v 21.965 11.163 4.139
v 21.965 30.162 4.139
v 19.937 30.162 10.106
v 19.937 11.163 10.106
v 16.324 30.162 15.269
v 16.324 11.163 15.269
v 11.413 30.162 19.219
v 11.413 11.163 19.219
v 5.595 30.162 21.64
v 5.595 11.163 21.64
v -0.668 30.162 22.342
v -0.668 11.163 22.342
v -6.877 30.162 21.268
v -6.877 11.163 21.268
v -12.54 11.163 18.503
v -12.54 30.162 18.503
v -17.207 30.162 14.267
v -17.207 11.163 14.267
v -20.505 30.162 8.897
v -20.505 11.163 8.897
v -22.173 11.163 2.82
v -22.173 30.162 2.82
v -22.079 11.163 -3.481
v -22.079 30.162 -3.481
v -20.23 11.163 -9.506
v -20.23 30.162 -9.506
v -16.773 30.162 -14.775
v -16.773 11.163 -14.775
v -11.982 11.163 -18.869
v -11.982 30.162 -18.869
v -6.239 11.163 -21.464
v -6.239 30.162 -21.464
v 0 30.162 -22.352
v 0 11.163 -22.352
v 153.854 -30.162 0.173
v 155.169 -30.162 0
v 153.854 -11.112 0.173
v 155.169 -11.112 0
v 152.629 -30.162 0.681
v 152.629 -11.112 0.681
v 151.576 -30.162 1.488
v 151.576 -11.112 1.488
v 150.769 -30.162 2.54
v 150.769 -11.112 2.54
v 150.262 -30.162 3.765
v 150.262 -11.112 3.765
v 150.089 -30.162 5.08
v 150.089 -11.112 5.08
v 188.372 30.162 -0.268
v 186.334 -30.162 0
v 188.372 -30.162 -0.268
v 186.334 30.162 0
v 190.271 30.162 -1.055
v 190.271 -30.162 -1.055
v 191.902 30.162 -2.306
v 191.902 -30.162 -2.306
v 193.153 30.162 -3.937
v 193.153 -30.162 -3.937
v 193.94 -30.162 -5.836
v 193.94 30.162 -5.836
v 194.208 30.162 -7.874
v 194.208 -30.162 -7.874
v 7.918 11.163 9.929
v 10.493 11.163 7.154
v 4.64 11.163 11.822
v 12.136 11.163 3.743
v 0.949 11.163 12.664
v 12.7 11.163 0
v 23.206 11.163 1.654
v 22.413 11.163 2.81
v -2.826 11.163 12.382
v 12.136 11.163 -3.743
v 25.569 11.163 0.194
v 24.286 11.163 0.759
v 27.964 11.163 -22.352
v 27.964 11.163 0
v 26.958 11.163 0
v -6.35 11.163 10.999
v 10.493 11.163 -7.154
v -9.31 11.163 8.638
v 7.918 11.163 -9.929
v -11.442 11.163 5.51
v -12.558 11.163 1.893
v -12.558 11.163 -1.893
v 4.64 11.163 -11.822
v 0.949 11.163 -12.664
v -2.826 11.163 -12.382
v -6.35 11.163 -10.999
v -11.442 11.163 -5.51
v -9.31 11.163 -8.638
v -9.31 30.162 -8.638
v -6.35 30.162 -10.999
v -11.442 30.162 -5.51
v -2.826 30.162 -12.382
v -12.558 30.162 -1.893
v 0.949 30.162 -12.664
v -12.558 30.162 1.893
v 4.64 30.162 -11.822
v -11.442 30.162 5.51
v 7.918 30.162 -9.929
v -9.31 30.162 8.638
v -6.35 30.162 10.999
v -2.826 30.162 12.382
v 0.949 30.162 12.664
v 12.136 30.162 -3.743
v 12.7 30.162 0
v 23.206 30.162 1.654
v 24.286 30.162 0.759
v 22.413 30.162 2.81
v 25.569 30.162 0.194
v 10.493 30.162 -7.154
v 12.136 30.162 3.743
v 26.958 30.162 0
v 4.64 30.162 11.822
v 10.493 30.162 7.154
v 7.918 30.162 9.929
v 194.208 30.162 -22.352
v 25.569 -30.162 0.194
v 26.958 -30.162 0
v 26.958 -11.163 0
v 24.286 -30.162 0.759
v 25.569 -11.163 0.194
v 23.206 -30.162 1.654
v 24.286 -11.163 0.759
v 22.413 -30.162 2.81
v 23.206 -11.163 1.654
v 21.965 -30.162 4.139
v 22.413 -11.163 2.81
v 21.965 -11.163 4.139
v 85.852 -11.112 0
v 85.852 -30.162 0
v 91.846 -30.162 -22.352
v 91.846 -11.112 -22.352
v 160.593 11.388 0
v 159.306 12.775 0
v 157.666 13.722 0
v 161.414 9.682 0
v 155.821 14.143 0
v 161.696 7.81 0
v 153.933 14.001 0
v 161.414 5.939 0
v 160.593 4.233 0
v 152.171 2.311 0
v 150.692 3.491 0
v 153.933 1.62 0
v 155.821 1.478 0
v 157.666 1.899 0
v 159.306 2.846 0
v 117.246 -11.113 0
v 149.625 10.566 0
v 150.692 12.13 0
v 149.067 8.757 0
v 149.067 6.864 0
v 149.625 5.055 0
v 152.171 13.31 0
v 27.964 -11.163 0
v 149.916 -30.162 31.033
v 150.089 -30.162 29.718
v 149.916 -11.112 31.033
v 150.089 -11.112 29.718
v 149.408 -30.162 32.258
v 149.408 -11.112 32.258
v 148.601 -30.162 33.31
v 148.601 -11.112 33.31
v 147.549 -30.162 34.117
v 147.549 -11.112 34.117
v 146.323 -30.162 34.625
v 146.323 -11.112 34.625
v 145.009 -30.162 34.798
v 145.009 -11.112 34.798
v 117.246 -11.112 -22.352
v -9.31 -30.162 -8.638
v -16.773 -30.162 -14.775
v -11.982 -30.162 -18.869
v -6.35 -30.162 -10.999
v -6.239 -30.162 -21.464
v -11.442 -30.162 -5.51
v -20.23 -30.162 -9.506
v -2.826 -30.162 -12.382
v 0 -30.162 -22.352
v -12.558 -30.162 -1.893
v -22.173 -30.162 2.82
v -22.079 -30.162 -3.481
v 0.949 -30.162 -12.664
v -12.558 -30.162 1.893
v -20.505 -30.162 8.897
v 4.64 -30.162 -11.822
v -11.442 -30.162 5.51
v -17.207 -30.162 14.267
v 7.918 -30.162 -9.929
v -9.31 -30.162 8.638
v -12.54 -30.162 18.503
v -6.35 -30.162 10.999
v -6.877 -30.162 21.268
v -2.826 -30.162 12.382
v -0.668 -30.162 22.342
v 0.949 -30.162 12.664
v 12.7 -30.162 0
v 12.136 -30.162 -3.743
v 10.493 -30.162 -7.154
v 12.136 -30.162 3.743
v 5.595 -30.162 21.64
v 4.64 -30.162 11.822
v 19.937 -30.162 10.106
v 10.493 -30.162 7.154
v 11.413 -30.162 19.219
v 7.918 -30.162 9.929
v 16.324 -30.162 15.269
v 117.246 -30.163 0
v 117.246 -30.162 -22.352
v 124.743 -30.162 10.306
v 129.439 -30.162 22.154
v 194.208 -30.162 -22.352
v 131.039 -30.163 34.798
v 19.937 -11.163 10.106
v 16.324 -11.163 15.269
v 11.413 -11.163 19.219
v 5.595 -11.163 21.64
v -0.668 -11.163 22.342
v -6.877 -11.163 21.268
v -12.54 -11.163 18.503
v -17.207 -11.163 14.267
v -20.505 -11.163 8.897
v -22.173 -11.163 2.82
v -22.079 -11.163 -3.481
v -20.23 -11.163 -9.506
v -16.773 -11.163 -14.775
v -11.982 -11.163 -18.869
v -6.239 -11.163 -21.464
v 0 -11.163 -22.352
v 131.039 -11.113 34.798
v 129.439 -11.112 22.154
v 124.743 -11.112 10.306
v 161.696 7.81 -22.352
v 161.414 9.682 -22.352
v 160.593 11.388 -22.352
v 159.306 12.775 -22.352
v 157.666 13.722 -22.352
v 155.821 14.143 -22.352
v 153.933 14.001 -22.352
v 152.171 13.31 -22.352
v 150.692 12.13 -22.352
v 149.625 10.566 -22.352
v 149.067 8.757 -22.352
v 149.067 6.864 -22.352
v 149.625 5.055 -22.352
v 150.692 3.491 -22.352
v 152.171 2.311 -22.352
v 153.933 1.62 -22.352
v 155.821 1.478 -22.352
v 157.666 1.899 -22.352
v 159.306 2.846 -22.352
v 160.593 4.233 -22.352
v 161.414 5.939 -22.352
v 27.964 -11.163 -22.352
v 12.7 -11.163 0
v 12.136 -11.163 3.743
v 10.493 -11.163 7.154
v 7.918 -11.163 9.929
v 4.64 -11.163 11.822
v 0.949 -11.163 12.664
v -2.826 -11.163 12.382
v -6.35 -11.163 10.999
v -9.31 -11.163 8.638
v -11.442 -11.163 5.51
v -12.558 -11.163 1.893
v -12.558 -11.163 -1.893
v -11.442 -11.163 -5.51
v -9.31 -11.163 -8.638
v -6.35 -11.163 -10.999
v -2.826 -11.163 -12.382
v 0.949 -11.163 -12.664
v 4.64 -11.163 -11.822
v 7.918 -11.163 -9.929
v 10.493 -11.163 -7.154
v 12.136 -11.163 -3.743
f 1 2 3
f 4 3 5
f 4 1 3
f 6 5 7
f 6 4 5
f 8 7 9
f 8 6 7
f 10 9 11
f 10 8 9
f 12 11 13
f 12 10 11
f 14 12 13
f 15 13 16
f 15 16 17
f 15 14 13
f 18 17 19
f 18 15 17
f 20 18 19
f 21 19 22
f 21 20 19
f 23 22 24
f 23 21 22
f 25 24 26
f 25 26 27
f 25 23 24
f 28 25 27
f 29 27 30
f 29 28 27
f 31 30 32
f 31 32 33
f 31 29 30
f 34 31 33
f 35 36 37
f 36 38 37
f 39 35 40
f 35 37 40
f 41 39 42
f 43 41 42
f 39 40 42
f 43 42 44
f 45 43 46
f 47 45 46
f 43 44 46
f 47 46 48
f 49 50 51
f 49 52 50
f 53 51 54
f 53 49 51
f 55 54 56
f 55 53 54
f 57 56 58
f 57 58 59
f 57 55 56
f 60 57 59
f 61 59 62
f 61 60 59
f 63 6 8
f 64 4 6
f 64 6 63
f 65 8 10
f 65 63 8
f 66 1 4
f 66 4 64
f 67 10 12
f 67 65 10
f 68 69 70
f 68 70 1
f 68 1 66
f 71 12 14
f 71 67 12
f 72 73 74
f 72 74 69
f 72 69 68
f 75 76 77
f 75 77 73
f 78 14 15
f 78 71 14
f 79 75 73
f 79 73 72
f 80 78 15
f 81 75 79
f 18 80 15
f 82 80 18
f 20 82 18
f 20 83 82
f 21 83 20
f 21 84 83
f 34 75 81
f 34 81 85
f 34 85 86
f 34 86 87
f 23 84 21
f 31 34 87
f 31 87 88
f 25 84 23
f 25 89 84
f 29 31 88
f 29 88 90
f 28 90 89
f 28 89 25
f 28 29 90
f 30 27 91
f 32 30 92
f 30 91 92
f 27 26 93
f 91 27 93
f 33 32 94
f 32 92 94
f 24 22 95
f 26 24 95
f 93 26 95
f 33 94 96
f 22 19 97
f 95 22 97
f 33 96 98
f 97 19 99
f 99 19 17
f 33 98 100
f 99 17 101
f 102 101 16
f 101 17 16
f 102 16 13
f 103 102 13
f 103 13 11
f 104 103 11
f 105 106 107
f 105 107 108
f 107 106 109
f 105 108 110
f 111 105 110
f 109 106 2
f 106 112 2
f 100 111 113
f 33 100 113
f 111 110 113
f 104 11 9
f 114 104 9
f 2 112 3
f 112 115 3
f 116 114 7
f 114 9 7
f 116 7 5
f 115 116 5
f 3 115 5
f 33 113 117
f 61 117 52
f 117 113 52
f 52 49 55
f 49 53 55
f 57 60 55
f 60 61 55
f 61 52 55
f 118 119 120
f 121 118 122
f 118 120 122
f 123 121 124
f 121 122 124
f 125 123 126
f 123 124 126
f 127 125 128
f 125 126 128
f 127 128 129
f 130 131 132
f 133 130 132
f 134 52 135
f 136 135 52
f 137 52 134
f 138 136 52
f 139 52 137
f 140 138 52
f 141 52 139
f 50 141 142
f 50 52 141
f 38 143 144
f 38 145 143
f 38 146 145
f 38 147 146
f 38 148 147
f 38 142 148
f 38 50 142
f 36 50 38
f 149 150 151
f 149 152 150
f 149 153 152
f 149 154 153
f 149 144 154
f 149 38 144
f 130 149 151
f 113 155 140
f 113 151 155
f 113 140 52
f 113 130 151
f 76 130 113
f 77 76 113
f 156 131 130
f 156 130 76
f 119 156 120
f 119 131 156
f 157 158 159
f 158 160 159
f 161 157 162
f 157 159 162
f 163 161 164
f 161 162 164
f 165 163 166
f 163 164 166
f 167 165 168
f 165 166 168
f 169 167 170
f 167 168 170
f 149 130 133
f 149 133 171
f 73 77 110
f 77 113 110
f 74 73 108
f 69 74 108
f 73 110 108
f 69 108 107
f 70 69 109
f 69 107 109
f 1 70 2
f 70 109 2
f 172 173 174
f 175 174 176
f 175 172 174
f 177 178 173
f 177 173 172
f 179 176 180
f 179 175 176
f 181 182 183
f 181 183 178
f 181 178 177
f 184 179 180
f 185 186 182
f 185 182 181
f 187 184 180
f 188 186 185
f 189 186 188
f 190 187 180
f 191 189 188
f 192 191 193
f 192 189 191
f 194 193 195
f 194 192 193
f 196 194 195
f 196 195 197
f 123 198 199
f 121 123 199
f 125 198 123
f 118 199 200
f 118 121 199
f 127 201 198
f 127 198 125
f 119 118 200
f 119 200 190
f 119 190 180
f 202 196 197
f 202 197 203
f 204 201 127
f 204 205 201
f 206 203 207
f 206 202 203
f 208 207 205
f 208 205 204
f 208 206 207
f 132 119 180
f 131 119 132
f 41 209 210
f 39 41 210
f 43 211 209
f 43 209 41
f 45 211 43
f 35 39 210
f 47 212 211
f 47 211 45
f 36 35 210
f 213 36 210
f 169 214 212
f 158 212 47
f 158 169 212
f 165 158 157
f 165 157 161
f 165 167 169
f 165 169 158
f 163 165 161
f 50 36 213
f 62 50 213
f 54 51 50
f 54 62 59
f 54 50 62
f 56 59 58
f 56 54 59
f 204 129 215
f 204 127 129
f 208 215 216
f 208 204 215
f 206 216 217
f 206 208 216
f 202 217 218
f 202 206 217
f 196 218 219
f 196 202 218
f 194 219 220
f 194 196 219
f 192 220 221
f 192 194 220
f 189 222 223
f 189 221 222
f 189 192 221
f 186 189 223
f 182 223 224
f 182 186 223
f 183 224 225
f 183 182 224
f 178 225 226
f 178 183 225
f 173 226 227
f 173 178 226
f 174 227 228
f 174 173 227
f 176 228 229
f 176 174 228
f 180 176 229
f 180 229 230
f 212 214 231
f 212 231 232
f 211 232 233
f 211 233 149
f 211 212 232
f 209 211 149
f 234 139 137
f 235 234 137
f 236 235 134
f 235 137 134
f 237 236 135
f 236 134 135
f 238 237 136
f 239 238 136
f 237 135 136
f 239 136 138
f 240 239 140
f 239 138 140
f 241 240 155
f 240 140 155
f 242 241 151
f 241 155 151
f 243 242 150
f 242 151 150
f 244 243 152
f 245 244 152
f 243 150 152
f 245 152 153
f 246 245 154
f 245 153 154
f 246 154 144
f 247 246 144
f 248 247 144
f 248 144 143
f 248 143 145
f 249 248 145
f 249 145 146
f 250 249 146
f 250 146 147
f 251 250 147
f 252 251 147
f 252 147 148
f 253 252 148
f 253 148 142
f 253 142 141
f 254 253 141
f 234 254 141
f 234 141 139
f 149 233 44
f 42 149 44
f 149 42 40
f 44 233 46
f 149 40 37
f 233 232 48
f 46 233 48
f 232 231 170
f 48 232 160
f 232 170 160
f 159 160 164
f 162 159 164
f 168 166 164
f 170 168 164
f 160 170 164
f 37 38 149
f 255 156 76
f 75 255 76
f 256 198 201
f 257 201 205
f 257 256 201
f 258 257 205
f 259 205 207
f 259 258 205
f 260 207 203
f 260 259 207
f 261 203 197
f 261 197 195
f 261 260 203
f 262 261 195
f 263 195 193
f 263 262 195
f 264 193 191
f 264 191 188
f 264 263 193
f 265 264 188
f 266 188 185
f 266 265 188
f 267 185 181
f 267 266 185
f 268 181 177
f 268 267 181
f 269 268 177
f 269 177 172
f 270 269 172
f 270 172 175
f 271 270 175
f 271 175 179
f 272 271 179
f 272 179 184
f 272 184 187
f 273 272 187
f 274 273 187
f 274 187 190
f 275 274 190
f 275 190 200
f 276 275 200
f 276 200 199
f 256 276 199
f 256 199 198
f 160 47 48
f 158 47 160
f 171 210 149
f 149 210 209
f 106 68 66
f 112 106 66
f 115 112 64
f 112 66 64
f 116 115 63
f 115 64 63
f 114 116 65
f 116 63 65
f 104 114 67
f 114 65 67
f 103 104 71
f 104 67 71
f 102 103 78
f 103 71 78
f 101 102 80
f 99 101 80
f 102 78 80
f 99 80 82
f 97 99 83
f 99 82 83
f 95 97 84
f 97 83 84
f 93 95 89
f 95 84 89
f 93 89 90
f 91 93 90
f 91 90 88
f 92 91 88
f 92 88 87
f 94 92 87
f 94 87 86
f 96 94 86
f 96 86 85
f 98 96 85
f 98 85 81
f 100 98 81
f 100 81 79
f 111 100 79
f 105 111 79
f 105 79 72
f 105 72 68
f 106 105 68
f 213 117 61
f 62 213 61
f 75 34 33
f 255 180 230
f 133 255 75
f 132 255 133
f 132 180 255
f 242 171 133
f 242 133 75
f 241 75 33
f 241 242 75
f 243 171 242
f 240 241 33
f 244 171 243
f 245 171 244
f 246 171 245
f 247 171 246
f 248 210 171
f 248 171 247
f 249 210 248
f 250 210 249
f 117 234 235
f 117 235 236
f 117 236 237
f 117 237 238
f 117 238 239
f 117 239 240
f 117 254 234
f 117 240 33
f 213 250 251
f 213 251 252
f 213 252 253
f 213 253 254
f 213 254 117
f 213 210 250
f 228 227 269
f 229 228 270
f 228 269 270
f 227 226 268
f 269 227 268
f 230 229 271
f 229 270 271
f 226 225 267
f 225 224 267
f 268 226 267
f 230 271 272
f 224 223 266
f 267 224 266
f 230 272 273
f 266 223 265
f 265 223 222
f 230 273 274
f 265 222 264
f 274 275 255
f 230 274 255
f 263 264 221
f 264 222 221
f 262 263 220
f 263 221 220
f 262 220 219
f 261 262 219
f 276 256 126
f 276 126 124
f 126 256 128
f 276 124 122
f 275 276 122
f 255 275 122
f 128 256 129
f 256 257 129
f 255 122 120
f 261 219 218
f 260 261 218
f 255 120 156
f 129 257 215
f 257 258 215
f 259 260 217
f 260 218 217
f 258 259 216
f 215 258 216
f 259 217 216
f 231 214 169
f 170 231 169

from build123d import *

# Parameters (mm, degrees)
F0_R      = 12.7
F1_DEPTH  = 30.1625
F3_W      = 5.6116215229
F3_H      = 22.3266
F3_W_2    = 50.3156215229
F4_DEPTH  = 25.4
F6_DEPTH  = 25.4
F7_R      = 6.35
F8_DEPTH  = 25.4
F9_R      = 7.874
F10_R     = 5.08
F12_DEPTH = 19.05
F13_W     = 19.05
F13_H     = 34.798
F14_DEPTH = 19.05
F15_R     = 5.08
F17_DEPTH = 19.05


with BuildPart() as f1:
    # F0 (on Front) → F1 (new body)
    with BuildSketch(Plane.XZ):
        with BuildLine():
            ThreePointArc((0, -22.352), (15.8052507731, -15.8052507731), (22.352, 0))
            ThreePointArc((22.352, 0), (-15.8052507731, 15.8052507731), (0, -22.352))
        make_face()
        Circle(F0_R, mode=Mode.SUBTRACT)
        with BuildLine():
            Line((194.2084, 0), (22.352, 0))
            ThreePointArc((22.352, 0), (15.8052507731, -15.8052507731), (0, -22.352))
            Line((0, -22.352), (194.2084, -22.352))
            Line((194.2084, -22.352), (194.2084, 0))
        make_face()
    extrude(amount=F1_DEPTH)

    # F2: F1 across plane


with BuildPart() as f1_1:
    add(f1.part)
    add(f1.part.mirror(Plane.XZ))

    # F3 (on face) → F4 (cut)
    with BuildSketch(Plane.XY):
        with Locations((25.1578107615, 0)):
            Rectangle(F3_W, F3_H)
        with Locations((-2.8058107615, 0)):
            Rectangle(F3_W_2, F3_H)
    extrude(amount=-F4_DEPTH, mode=Mode.SUBTRACT)

    # F5 (on face) → F6 (cut)
    with BuildSketch(Plane.XY):
        Polygon((-49.2868088186, -11.1633), (27.9636215229, -11.1633), (27.9636215229, 11.1633), (-41.6799448431, 11.1633), align=None)
    extrude(amount=F6_DEPTH, mode=Mode.SUBTRACT)

    # F7 (on face) → F8 (cut)
    with BuildSketch(Plane.XY):
        with Locations((155.3464, 7.8105)):
            Circle(F7_R)
    extrude(amount=-F8_DEPTH, mode=Mode.SUBTRACT)

    # F9
    f9_edges = [f1_1.edges().sort_by_distance(p)[0] for p in [
        (194.2084, 0, 0),
    ]]
    fillet(f9_edges, radius=F9_R)

    # F10
    f10_edges = [f1_1.edges().sort_by_distance(p)[0] for p in [
        (22.352, -20.6629, 0),
        (22.352, 20.6629, 0),
    ]]
    fillet(f10_edges, radius=F10_R)

    # F11 (on face) → F12 (cut)
    with BuildSketch(Plane.XZ.offset(30.1625)):
        Polygon((117.2464, 0), (85.852, 0), (91.8464, -22.352), (117.2464, -22.352), align=None)
    extrude(amount=-F12_DEPTH, mode=Mode.SUBTRACT)

    # F13 (on face) → F14 (join)
    with BuildSketch(Plane.XZ.offset(30.1625)):
        with Locations((140.5636, 17.399)):
            Rectangle(F13_W, F13_H)
    extrude(amount=-F14_DEPTH)

    # F15
    f15_edges = [f1_1.edges().sort_by_distance(p)[0] for p in [
        (150.0886, -20.6375, 0),
        (150.0886, -20.6375, 34.798),
    ]]
    fillet(f15_edges, radius=F15_R)

    # F16 (on face) → F17 (join)
    with BuildSketch(Plane.XZ.offset(30.1625)):
        with BuildLine():
            ThreePointArc((131.0386, 34.798), (127.4644153616, 16.0823576341), (117.2464, 0))
            Line((117.2464, 0), (131.0386, 0))
            Line((131.0386, 0), (131.0386, 34.798))
        make_face()
    extrude(amount=-F17_DEPTH)


solid = f1_1.part
